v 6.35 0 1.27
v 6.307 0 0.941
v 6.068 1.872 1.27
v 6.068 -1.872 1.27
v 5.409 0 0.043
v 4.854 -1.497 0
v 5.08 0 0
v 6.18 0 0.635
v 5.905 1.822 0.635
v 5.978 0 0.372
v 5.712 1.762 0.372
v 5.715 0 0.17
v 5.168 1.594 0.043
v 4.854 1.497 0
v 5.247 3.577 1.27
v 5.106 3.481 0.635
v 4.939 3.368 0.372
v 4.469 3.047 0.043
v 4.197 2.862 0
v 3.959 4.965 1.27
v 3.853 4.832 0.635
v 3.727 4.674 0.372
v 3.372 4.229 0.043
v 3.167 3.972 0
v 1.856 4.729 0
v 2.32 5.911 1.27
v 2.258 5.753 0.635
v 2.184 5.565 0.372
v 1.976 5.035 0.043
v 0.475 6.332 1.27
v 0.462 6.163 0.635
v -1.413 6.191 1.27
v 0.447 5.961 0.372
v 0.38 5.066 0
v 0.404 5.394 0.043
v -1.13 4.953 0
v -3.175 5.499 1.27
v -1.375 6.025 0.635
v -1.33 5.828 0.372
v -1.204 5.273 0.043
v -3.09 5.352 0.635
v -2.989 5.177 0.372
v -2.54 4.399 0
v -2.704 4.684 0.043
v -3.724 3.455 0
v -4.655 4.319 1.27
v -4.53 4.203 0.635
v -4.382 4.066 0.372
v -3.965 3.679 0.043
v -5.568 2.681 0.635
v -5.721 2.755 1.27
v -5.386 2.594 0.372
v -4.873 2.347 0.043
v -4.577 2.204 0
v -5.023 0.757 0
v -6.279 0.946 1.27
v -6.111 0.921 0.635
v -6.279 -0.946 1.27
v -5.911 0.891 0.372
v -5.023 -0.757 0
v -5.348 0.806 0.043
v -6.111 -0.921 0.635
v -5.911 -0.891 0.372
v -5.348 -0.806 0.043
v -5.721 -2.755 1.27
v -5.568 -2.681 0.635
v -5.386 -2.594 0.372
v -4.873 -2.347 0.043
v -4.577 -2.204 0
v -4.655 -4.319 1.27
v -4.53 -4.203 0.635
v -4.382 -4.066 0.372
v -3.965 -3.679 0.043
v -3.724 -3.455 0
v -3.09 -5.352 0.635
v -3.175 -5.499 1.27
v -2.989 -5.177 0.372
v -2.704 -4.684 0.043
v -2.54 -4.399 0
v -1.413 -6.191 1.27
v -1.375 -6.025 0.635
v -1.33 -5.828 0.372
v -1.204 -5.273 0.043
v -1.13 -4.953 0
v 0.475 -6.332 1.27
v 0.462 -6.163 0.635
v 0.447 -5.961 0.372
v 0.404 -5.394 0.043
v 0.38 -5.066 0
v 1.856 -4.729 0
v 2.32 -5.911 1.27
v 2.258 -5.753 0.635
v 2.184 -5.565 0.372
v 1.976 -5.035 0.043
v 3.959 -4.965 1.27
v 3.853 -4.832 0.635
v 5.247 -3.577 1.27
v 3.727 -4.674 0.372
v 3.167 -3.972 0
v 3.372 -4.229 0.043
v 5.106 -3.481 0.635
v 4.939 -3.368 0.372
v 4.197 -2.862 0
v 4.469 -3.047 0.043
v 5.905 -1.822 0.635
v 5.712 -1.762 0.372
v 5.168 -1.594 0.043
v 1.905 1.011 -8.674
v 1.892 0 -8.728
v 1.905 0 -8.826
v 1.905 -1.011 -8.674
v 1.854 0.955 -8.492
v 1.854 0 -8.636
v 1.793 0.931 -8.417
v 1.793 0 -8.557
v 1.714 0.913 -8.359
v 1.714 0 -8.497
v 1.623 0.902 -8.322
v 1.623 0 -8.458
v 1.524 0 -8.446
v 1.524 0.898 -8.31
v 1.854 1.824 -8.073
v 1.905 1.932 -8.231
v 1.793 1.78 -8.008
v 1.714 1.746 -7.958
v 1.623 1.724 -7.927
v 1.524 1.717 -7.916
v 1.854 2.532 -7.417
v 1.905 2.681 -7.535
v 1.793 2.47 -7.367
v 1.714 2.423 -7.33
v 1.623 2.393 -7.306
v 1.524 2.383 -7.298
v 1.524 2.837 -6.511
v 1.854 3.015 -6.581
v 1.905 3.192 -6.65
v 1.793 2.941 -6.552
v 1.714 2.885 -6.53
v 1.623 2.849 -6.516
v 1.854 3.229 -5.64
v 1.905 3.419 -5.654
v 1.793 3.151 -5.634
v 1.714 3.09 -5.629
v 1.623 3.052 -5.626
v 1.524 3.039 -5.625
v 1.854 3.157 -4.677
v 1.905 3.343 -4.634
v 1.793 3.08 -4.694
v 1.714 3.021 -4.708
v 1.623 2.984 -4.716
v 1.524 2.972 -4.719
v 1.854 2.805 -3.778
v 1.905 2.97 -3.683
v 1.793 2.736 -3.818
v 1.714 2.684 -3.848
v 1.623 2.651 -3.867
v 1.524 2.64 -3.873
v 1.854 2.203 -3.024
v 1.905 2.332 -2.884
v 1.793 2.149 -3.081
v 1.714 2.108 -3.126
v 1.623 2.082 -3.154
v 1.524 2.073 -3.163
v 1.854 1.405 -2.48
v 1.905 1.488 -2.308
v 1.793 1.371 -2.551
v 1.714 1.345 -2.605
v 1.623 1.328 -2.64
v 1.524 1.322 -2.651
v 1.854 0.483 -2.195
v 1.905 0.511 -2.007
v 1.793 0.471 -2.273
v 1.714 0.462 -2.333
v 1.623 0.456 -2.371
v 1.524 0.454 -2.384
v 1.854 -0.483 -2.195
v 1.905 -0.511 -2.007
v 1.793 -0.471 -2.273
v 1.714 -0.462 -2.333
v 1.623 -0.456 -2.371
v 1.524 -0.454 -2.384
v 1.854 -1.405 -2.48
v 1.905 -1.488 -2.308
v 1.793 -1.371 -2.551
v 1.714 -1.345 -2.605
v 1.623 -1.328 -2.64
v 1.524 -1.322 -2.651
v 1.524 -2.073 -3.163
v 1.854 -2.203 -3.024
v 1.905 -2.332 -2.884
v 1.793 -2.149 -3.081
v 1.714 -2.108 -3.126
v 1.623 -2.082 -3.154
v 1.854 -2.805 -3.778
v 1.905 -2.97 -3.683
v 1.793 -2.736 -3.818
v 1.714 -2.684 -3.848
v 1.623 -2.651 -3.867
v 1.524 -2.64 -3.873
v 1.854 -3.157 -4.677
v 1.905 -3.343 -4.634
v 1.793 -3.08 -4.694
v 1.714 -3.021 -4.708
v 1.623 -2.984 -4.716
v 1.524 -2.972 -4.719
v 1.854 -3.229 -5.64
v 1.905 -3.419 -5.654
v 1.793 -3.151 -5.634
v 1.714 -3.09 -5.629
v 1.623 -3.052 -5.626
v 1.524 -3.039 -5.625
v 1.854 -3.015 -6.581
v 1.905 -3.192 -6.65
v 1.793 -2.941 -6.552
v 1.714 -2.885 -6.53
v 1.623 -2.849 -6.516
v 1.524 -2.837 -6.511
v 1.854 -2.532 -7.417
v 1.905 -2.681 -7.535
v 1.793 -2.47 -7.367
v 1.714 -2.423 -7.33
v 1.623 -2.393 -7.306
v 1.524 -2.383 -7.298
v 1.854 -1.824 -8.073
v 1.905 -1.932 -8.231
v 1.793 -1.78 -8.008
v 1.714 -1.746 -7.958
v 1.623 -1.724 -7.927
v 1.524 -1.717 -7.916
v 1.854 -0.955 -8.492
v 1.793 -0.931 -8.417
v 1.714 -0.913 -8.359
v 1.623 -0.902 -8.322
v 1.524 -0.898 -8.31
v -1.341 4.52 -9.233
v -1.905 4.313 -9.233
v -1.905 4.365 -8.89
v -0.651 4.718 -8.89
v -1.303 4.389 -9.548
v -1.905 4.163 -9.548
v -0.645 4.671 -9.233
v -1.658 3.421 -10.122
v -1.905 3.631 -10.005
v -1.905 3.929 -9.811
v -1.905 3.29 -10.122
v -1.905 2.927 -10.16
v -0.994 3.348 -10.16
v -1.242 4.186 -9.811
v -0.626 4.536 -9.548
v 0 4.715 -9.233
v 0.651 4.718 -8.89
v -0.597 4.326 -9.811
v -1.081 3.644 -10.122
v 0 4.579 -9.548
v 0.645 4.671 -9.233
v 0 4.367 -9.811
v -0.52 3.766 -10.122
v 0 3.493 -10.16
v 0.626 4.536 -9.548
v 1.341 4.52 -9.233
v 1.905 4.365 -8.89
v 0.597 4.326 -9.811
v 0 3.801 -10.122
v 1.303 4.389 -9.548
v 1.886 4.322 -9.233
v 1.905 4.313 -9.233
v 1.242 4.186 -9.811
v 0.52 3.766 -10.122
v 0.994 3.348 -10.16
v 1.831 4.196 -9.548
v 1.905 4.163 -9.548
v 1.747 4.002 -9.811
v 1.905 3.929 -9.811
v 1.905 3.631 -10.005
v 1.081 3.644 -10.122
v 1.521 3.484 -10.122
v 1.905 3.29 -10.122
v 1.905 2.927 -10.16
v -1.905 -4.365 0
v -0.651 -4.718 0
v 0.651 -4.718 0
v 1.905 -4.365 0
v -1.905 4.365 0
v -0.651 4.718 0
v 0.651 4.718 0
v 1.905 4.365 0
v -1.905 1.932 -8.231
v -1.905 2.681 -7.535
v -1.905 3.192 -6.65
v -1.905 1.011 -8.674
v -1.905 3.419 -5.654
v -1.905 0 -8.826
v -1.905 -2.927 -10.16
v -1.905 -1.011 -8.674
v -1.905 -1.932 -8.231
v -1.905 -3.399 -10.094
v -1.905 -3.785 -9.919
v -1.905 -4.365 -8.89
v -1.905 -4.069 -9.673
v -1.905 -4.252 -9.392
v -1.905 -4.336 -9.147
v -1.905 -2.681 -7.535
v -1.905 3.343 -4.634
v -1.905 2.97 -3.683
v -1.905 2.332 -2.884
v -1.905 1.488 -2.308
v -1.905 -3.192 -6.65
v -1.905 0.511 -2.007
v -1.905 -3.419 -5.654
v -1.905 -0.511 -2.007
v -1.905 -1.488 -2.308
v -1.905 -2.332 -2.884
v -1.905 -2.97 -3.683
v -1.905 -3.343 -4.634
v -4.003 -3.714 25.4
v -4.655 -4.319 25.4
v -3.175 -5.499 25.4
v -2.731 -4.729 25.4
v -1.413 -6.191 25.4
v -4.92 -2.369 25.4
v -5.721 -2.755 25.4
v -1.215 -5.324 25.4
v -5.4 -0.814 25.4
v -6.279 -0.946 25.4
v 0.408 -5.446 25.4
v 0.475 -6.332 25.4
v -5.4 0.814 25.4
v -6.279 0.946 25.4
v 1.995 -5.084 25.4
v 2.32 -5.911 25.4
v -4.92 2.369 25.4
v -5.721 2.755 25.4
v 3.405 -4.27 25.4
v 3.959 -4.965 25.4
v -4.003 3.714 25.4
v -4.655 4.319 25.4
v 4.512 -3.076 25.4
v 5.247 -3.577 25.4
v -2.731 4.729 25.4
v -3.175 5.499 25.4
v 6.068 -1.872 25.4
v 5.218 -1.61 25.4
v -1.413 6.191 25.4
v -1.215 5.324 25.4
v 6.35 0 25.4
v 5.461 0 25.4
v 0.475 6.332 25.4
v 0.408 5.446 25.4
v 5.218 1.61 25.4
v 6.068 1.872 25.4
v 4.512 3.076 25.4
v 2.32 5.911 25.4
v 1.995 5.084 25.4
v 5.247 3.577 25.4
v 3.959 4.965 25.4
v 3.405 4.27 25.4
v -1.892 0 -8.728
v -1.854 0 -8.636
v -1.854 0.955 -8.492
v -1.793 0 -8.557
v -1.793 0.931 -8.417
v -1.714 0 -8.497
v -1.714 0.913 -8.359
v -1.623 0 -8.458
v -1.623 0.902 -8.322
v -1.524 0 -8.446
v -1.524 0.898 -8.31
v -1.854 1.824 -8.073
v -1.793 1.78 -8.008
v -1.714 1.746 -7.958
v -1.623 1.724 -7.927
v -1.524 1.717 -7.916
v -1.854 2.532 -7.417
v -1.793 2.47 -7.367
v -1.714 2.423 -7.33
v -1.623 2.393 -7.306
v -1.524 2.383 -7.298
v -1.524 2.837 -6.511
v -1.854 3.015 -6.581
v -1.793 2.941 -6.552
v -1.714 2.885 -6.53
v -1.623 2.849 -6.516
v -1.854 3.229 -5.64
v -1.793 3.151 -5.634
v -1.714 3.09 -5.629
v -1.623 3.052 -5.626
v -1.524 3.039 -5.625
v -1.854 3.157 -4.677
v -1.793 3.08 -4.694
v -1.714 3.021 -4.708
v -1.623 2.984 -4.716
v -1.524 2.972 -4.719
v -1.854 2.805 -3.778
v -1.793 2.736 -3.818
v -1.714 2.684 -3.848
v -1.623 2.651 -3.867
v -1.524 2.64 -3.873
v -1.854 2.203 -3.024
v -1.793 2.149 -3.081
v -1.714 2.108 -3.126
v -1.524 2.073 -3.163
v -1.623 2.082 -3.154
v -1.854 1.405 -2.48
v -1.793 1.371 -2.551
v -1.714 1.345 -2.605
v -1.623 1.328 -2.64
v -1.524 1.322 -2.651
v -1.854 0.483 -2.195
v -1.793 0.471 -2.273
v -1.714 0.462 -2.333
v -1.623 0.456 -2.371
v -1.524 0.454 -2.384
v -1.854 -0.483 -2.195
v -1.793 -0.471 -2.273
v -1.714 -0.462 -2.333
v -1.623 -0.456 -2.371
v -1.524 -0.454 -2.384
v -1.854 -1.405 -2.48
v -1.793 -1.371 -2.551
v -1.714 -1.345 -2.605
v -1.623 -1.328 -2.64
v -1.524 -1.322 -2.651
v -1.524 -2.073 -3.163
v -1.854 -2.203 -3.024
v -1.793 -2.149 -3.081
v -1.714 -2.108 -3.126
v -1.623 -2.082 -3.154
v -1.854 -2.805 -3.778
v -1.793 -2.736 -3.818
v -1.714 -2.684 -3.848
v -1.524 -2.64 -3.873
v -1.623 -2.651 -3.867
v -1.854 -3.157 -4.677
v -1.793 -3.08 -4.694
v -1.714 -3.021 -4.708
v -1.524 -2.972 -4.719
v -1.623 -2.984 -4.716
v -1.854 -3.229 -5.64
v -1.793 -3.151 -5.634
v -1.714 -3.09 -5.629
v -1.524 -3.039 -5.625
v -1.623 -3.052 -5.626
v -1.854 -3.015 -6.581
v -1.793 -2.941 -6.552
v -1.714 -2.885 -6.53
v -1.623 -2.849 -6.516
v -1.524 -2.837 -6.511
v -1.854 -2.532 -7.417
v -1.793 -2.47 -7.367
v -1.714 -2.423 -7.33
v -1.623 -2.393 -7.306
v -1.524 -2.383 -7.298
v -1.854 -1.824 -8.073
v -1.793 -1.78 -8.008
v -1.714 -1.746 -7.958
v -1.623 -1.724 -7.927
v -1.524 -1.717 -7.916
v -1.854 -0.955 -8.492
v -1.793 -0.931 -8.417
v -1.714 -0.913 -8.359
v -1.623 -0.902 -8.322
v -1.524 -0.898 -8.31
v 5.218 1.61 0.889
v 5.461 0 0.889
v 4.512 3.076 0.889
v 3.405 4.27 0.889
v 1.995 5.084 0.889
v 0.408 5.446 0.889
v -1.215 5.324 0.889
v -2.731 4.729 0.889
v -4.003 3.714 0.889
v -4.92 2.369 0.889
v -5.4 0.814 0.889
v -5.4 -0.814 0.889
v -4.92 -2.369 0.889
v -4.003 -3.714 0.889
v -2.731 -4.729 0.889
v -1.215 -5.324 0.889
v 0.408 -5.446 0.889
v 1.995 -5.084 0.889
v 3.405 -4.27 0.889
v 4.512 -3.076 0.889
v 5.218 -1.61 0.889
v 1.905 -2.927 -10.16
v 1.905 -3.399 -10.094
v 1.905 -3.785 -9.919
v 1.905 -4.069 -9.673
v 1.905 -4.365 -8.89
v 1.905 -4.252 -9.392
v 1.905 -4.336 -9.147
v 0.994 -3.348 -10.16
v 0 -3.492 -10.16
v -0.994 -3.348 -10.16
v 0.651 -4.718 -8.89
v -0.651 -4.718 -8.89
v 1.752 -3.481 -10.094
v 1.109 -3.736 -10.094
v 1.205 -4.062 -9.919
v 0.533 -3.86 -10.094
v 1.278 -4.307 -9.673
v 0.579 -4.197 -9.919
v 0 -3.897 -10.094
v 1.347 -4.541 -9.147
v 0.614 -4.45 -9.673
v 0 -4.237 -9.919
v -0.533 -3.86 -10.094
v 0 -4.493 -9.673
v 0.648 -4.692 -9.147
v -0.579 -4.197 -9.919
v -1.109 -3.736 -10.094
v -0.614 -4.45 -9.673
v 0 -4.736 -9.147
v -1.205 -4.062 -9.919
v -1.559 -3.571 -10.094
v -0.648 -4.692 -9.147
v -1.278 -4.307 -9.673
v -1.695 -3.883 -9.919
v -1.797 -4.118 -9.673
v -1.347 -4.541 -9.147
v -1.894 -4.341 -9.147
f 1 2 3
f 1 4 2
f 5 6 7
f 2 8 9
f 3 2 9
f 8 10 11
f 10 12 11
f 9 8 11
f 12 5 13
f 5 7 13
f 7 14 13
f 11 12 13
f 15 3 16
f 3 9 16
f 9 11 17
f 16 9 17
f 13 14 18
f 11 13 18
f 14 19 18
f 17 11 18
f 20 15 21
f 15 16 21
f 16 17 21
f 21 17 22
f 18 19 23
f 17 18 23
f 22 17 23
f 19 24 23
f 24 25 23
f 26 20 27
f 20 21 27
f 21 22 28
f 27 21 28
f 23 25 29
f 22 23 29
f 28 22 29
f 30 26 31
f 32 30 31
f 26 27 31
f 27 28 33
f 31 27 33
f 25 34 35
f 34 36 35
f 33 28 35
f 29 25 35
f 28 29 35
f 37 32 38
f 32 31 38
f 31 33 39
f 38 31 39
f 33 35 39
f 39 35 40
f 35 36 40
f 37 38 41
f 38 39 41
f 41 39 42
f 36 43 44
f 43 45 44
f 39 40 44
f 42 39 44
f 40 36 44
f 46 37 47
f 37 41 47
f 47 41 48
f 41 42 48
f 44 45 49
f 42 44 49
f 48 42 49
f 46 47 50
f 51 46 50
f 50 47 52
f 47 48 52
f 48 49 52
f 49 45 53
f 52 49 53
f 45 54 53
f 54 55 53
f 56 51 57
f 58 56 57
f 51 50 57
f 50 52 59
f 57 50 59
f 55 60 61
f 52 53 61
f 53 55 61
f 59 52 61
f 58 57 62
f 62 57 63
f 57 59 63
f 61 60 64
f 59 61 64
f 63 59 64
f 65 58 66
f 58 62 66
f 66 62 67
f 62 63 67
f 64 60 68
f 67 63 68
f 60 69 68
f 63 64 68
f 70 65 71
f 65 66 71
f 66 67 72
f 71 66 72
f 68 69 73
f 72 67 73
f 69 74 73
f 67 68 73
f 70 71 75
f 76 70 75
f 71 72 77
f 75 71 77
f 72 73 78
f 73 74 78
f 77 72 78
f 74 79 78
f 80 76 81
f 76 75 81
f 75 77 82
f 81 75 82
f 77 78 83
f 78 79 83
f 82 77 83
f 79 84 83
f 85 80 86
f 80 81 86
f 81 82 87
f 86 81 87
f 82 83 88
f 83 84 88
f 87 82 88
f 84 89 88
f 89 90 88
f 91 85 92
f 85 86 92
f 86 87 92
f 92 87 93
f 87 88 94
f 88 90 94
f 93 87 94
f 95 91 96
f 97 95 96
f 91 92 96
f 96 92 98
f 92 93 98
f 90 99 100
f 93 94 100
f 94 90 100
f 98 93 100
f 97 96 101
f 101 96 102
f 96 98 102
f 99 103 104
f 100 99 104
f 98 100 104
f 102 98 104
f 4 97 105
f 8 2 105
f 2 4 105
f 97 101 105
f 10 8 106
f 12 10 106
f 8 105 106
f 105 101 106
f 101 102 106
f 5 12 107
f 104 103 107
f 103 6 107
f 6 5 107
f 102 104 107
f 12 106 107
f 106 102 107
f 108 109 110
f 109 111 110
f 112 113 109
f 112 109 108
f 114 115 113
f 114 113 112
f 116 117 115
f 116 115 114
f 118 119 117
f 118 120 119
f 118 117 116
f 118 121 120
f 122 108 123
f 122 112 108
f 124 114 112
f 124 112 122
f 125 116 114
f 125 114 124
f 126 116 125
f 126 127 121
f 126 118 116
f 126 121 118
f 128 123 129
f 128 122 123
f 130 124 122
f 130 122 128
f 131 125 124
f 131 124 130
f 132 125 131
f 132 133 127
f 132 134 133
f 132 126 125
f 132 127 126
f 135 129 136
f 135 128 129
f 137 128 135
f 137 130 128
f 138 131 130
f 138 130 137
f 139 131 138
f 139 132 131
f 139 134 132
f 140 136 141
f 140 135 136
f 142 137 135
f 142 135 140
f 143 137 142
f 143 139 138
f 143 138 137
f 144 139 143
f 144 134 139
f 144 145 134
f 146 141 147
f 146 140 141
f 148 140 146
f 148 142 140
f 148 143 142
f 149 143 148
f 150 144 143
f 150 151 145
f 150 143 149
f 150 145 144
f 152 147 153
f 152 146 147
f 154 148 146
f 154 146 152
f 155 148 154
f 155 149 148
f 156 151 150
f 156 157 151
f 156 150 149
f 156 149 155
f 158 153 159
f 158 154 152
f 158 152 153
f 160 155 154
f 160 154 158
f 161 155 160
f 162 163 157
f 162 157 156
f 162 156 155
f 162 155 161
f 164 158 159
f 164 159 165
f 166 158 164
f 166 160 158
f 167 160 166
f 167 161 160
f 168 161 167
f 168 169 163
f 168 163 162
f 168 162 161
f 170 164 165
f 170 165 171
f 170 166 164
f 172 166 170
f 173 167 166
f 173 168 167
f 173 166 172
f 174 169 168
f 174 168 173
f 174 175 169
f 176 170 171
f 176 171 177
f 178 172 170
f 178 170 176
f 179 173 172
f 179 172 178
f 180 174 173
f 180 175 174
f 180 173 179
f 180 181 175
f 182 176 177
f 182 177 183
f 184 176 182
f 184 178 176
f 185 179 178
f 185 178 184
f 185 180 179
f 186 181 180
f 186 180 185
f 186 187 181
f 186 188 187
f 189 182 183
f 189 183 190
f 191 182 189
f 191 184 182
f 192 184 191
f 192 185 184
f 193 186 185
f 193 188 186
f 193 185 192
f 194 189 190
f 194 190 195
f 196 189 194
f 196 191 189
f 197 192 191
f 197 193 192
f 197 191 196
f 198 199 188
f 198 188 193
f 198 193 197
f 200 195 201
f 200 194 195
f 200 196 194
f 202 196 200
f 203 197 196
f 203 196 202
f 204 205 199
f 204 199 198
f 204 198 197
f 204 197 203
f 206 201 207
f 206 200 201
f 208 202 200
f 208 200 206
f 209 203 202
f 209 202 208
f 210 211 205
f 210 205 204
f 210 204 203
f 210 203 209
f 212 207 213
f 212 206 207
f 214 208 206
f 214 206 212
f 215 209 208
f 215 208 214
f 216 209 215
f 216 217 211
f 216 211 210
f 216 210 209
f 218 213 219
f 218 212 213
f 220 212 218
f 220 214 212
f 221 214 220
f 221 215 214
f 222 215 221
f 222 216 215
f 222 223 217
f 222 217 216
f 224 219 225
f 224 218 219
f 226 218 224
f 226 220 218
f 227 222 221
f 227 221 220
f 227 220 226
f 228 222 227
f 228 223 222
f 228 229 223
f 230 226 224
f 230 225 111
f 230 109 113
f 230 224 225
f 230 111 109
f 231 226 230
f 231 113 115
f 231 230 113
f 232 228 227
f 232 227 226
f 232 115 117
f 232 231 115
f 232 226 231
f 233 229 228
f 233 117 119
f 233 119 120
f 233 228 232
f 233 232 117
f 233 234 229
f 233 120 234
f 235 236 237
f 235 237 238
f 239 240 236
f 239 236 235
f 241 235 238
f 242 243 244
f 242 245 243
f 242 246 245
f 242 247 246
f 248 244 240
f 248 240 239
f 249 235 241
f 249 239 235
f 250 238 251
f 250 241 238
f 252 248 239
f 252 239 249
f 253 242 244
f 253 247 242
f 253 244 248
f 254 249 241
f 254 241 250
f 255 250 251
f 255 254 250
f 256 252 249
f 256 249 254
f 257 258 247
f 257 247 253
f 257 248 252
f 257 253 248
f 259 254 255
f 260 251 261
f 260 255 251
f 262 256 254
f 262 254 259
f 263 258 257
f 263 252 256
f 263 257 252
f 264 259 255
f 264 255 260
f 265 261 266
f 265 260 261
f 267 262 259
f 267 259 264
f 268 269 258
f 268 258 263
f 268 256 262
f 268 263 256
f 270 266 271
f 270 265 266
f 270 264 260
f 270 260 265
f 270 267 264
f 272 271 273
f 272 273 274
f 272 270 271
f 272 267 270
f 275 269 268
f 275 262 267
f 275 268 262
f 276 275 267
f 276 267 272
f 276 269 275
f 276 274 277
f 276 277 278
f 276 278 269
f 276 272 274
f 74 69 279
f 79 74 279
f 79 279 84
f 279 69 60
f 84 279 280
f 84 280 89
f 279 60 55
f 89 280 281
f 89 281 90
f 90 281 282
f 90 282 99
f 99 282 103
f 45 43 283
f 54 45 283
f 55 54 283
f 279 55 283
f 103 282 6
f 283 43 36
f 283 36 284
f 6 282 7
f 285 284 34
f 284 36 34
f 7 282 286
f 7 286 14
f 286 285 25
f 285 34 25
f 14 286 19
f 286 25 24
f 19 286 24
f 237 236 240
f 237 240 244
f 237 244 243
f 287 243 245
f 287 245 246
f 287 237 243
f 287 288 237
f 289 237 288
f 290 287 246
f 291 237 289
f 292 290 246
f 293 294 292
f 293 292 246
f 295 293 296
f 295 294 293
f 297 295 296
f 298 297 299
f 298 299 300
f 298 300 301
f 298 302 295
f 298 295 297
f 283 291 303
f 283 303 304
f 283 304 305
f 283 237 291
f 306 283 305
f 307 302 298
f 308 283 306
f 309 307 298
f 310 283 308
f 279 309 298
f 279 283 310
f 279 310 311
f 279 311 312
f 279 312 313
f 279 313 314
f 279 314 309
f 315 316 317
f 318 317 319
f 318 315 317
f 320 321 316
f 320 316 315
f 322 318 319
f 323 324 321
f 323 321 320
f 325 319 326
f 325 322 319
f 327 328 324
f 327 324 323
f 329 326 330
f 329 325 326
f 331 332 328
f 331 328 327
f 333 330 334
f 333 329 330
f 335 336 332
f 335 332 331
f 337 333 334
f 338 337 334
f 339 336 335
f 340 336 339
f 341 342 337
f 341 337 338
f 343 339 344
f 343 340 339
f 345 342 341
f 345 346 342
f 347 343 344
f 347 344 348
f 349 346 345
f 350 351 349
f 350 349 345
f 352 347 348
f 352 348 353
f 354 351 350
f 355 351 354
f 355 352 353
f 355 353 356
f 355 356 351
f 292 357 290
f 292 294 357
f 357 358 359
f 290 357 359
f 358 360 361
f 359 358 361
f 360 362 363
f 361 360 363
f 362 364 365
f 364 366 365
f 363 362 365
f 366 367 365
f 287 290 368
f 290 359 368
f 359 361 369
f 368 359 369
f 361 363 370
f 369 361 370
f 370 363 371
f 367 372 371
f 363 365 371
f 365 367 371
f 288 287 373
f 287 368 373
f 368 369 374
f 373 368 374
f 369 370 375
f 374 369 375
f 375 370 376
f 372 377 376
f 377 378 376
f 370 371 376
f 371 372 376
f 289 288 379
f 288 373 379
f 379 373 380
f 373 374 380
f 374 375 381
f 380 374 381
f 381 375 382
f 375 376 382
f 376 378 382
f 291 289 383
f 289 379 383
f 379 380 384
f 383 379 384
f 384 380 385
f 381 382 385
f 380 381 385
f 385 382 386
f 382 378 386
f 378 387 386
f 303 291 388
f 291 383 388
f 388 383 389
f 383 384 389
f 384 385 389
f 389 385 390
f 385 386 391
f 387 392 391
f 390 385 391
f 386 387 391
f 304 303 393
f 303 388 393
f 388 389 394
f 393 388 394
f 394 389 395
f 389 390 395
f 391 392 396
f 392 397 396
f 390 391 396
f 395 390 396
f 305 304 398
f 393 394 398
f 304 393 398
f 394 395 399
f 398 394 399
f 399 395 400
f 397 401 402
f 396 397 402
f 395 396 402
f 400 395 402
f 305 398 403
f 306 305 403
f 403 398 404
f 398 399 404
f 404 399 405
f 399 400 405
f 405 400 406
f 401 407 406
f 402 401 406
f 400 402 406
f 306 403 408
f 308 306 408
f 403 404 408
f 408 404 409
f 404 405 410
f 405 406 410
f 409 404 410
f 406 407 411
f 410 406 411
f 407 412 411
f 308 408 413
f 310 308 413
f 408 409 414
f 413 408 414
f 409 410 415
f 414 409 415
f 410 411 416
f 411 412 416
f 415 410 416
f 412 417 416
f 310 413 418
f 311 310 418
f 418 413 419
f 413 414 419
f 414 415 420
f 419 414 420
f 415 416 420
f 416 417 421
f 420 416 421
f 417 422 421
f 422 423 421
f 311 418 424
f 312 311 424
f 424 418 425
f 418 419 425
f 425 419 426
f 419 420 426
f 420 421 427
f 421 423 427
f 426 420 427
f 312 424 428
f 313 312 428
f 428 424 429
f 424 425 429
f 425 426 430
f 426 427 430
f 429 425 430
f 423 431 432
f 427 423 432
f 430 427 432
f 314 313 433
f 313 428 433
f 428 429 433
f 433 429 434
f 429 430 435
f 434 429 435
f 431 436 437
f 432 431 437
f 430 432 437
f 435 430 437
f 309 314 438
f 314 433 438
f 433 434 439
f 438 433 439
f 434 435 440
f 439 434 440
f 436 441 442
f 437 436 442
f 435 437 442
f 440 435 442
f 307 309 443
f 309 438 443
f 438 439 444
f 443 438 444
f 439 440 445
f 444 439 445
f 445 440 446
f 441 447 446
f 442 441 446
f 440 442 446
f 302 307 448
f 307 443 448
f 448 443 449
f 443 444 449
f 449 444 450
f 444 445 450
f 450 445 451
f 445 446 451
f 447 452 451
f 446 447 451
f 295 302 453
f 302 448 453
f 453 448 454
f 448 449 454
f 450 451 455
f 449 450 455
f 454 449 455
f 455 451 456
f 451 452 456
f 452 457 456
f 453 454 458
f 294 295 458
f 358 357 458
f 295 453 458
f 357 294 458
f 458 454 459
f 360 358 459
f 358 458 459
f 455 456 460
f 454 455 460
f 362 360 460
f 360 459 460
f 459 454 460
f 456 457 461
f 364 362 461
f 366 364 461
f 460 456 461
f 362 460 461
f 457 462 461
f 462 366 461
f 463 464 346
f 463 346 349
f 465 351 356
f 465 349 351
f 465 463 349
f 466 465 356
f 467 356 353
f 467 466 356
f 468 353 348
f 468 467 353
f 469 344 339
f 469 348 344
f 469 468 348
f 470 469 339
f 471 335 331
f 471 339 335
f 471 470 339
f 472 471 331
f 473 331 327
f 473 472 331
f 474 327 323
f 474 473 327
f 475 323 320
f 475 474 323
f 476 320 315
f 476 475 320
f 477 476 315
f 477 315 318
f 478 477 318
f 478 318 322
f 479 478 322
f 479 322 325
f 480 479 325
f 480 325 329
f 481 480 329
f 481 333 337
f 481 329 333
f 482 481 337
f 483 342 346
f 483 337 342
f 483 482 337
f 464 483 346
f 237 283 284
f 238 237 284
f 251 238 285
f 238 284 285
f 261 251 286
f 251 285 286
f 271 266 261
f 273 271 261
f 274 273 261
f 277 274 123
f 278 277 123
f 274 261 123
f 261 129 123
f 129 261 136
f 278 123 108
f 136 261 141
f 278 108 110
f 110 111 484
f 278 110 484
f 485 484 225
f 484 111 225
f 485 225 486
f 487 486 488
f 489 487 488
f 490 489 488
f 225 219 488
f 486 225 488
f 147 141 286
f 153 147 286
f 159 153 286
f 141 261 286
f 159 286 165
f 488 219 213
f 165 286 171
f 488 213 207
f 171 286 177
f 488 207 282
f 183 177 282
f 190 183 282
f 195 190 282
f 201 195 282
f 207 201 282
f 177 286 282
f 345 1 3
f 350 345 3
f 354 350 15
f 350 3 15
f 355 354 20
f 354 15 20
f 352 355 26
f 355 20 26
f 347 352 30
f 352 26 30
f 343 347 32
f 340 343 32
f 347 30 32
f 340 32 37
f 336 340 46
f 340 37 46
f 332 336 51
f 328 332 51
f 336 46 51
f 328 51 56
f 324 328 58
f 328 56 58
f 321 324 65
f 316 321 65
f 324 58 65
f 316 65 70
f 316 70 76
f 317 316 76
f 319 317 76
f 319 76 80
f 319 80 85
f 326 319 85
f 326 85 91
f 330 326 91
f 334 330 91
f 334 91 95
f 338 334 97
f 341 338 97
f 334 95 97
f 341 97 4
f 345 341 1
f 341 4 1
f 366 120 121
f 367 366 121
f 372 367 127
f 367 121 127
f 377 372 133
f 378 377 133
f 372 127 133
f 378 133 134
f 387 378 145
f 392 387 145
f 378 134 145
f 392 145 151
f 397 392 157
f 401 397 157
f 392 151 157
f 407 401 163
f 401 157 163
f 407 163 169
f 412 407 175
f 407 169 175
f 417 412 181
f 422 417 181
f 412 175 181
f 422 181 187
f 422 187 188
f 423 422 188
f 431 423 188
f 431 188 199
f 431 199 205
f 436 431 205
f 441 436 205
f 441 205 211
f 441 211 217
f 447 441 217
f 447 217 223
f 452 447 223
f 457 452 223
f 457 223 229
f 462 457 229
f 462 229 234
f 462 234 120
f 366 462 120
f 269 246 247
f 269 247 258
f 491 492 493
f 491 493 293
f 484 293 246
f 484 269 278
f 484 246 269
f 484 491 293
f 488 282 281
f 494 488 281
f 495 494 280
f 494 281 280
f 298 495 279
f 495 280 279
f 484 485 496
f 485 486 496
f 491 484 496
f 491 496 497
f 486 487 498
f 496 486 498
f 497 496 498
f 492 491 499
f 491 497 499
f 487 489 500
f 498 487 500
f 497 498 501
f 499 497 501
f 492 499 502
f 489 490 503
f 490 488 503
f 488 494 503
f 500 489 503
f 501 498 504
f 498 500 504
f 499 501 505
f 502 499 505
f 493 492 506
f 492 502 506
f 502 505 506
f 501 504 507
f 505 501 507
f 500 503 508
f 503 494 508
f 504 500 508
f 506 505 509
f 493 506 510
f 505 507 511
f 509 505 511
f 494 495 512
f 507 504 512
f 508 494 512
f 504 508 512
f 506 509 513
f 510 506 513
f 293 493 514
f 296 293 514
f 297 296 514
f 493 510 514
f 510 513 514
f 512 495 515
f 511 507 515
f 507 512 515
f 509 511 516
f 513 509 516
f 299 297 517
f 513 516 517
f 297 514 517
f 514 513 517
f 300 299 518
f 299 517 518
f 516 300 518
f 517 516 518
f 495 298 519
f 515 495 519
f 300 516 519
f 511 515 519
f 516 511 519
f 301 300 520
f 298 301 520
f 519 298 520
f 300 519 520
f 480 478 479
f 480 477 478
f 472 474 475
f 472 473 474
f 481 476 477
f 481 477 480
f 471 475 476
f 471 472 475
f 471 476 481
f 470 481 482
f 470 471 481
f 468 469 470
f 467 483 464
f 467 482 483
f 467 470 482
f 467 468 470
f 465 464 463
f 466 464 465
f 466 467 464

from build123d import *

# Parameters (mm, degrees)
SKETCH1_R           = 6.35
BOSS_EXTRUDE1_DEPTH = 25.4
SHELL1_T            = -0.889
FILLET1_R           = 1.27
SKETCH2_R           = 4.7625
BOSS_EXTRUDE2_DEPTH = 10.16
CUT_EXTRUDE1_START  = -10.16
CUT_EXTRUDE1_DEPTH  = 10.16
SKETCH4_R           = 3.048
CUT_EXTRUDE2_DEPTH  = 28.452277251
FILLET2_R           = 0.381
FILLET3_R           = 1.27


with BuildPart() as part:
    # Sketch1 → Boss-Extrude1 (new body)
    with BuildSketch(Plane.XY):
        Circle(SKETCH1_R)
    extrude(amount=BOSS_EXTRUDE1_DEPTH)

    # Shell1
    shell1_openings = [part.faces().sort_by_distance(p)[0] for p in [
        (0, 0, 25.4),
    ]]
    offset(amount=SHELL1_T, openings=shell1_openings, kind=Kind.INTERSECTION)

    # Fillet1
    fillet1_edges = [part.edges().sort_by_distance(p)[0] for p in [
        (-6.35, 0, 0),
    ]]
    fillet(fillet1_edges, radius=FILLET1_R)

    # Sketch2 → Boss-Extrude2 (add)
    with BuildSketch(Plane(origin=(0, 0, 0), x_dir=(-1, 0, 0), z_dir=(0, 0, -1))):
        with Locations(Location((0, 0, 0), (0, 0, 180))):
            Circle(SKETCH2_R)
    extrude(amount=BOSS_EXTRUDE2_DEPTH)

    # Sketch3 → Cut-Extrude1 (cut)
    with BuildSketch(Plane(origin=(0, 0, -10.16), x_dir=(-1, 0, 0), z_dir=(0, 0, -1)).offset(CUT_EXTRUDE1_START)):
        with BuildLine():
            Line((-1.905, 4.364903349), (-1.905, -4.364903349))
            ThreePointArc((-1.905, -4.364903349), (-4.7625, 0), (-1.905, 4.364903349))
        make_face()
        with BuildLine():
            Line((1.905, 4.364903349), (1.905, -4.364903349))
            ThreePointArc((1.905, -4.364903349), (4.7625, 0), (1.905, 4.364903349))
        make_face()
    extrude(amount=CUT_EXTRUDE1_DEPTH, mode=Mode.SUBTRACT)

    # Sketch4 → Cut-Extrude2 (cut, through all)
    with BuildSketch(Plane(origin=(1.905, 0, 0), x_dir=(0, 0, -1), z_dir=(1, 0, 0))):
        with Locations((5.3975, 0)):
            Circle(SKETCH4_R)
    extrude(amount=-CUT_EXTRUDE2_DEPTH, mode=Mode.SUBTRACT)

    # Fillet2
    fillet2_edges = [part.edges().sort_by_distance(p)[0] for p in [
        (-1.905, 0, -2.3495),
        (1.905, 0, -2.3495),
    ]]
    fillet(fillet2_edges, radius=FILLET2_R)

    # Fillet3
    fillet3_edges = [part.edges().sort_by_distance(p)[0] for p in [
        (0, 4.7625, -10.16),
        (0, -4.7625, -10.16),
    ]]
    fillet(fillet3_edges, radius=FILLET3_R)


solid = part.part
